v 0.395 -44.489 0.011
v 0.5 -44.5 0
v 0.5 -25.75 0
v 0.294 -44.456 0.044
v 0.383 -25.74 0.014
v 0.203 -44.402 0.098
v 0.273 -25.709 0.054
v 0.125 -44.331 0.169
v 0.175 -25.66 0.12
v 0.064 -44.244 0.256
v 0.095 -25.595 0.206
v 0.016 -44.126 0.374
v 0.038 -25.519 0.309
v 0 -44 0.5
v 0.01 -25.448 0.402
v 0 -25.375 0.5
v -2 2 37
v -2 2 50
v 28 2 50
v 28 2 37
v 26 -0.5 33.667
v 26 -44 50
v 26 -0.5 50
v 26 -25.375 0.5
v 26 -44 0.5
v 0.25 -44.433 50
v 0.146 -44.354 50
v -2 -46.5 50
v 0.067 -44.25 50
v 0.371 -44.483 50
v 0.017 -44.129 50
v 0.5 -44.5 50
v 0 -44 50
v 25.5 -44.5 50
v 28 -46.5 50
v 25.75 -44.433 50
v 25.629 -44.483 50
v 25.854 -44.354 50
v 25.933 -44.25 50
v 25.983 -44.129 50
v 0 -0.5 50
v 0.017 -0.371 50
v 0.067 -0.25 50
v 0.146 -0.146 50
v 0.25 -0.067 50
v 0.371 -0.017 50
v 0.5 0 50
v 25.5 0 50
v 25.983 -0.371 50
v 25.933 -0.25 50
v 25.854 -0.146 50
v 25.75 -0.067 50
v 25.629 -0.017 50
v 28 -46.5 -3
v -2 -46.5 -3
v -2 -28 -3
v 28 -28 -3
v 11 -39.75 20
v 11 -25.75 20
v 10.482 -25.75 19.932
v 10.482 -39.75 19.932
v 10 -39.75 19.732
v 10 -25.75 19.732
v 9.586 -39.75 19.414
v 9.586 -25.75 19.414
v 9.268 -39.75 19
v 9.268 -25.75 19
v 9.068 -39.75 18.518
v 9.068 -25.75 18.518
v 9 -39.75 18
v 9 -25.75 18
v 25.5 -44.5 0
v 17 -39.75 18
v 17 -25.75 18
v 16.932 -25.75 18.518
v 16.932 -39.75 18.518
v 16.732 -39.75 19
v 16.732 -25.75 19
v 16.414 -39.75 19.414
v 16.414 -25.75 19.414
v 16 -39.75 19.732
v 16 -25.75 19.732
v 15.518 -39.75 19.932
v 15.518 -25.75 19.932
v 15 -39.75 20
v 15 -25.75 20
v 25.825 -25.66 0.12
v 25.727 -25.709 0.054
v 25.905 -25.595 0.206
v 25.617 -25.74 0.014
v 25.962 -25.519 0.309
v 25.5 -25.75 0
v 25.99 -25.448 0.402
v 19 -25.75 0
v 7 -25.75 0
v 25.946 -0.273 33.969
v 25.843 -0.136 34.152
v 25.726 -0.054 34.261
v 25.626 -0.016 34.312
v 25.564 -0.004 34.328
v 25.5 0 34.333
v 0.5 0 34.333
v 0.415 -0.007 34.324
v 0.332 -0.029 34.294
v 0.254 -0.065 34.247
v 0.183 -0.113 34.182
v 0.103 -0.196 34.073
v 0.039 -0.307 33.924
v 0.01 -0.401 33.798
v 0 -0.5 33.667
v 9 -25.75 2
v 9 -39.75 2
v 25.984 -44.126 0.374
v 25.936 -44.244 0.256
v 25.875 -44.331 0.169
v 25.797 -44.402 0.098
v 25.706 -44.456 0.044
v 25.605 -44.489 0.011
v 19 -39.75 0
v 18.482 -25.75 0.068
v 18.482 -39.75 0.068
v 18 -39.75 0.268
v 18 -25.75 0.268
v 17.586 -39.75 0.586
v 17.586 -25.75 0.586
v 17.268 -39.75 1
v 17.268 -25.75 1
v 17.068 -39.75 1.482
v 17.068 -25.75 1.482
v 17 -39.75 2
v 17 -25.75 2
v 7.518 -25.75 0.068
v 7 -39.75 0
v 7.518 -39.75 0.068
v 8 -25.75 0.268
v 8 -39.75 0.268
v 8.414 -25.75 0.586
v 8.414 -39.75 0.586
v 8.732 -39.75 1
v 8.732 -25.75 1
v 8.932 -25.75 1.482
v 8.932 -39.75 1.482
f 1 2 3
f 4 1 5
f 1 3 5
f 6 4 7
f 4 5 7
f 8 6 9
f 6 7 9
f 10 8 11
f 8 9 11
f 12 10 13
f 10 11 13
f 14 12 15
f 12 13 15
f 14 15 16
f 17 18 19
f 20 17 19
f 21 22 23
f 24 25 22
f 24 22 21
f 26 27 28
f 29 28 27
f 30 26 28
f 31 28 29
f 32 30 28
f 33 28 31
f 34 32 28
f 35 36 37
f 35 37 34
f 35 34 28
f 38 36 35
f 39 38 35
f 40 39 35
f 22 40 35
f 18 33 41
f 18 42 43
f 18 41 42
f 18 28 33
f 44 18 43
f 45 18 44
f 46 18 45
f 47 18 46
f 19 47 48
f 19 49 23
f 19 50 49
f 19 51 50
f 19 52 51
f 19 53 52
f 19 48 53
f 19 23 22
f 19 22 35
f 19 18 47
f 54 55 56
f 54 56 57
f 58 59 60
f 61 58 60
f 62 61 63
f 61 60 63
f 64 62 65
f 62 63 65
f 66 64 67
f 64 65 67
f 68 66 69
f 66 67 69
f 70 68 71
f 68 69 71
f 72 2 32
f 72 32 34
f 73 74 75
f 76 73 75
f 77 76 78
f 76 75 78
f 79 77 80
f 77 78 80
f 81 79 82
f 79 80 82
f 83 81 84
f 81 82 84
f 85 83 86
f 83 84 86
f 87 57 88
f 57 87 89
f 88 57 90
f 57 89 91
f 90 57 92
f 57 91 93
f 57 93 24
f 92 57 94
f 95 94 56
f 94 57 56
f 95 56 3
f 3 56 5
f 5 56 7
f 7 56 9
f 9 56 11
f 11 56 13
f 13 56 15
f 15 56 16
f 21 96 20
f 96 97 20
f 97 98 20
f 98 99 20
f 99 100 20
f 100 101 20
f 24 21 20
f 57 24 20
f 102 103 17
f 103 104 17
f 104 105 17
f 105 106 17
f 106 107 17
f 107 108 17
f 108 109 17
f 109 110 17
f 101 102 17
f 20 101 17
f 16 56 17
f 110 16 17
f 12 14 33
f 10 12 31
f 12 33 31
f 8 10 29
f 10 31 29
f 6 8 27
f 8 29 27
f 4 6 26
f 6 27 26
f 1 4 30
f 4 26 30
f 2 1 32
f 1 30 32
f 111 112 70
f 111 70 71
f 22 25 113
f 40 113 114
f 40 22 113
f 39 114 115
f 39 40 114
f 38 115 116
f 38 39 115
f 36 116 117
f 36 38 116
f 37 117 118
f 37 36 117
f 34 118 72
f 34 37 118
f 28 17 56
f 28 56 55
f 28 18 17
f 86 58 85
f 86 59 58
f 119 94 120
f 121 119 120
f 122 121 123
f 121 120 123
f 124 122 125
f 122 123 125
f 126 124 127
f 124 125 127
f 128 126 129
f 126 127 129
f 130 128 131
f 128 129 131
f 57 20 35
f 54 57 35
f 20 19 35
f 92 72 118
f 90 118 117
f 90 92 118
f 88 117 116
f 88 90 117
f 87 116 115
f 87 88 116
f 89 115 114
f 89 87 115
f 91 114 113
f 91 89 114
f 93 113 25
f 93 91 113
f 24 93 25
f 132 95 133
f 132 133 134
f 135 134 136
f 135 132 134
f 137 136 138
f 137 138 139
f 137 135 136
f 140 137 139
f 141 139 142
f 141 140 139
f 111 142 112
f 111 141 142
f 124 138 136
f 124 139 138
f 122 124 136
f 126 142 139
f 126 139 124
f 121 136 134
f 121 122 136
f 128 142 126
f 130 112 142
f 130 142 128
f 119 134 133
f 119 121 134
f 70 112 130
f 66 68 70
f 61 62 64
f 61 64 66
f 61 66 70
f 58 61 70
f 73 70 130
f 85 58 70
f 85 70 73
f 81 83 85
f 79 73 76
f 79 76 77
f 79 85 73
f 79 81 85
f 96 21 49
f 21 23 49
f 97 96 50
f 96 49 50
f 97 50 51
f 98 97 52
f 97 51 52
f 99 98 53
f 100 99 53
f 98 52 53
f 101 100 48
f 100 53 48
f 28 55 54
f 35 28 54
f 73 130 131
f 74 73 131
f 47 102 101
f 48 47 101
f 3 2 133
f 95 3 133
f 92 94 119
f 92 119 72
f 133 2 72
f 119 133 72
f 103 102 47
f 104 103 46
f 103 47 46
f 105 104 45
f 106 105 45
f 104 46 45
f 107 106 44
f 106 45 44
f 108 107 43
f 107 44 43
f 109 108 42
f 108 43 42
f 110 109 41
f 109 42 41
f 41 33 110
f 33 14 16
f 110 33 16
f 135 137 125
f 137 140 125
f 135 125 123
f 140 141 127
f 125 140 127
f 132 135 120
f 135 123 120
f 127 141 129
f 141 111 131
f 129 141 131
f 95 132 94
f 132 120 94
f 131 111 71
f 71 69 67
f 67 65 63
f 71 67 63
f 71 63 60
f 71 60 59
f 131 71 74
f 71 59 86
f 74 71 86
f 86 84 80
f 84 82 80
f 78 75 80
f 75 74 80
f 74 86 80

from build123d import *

# Parameters (mm, degrees)
F0_W        = 30
F0_H        = 48.5
F0_W_2      = 26
F0_H_2      = 44.5
F1_DEPTH    = 50
F2_W        = 30
F2_H        = 48.5
F3_DEPTH    = 3
F5_DEPTH    = 30
F6_W        = 4
F6_H        = 14
F7_DEPTH    = 20
F8_R        = 0.5
F9_T1_DEPTH = 14
F9_T3_DEPTH = 19


# Not quite as in the source:
# - a fillet or chamfer that OpenCascade refuses, or shapes differently, is made with other operations: its cross-section is extruded or revolved along the edge and cut away or added


with BuildPart() as f1:
    # F0 (on Top) → F1 (new body)
    with BuildSketch(Plane.XY):
        with Locations((13, -22.25)):
            Rectangle(F0_W, F0_H)
        with Locations((13, -22.25)):
            Rectangle(F0_W_2, F0_H_2, mode=Mode.SUBTRACT)
    extrude(amount=F1_DEPTH)

    # F2 (on face) → F3 (join)
    with BuildSketch(Plane(origin=(0, 0, 0), x_dir=(1, 0, 0), z_dir=(0, 0, -1))):
        with Locations((13, 22.25)):
            Rectangle(F2_W, F2_H)
    extrude(amount=F3_DEPTH)

    # F4 (on face) → F5 (cut)
    with BuildSketch(Plane(origin=(-2, 0, 0), x_dir=(0, -1, 0), z_dir=(-1, 0, 0))):
        Polygon((-2, 37), (-2, -3), (28, -3), align=None)
    extrude(amount=-F5_DEPTH, mode=Mode.SUBTRACT)

    # F6 (on face) → F7 (join)
    with BuildSketch(Plane.XY):
        with Locations((15, -32.75)):
            Rectangle(F6_W, F6_H)
        with Locations((11, -32.75)):
            Rectangle(F6_W, F6_H)
    extrude(amount=F7_DEPTH)

    # F8
    f8_edges = [f1.edges().sort_by_distance(p)[0] for p in [
        (0, -35.125, 0),
        (26, -35.125, 0),
        (0, 0, 42.166667),
        (0, -44.5, 25),
        (26, -44.5, 25),
        (26, 0, 42.166667),
    ]]
    fillet(f8_edges, radius=F8_R)

    # F9: fillet of radius 2 on 4 edges, made by hand

    # F9_s2 → F9_t1 (join)
    with BuildSketch(Plane.XZ.offset(25.75)):
        with BuildLine():
            ThreePointArc((19, 0), (17.5857864376, 0.5857864376), (17, 2))
            Line((17, 2), (17, 0))
            Line((17, 0), (19, 0))
        make_face()
        with BuildLine():
            ThreePointArc((7, 0), (8.4142135624, 0.5857864376), (9, 2))
            Line((9, 2), (9, 0))
            Line((9, 0), (7, 0))
        make_face()
    extrude(amount=F9_T1_DEPTH)

    # F9_s4 → F9_t3 (cut)
    with BuildSketch(Plane.XZ.offset(20.75)):
        with BuildLine():
            ThreePointArc((17, 18), (16.4142135624, 19.4142135624), (15, 20))
            Line((15, 20), (17, 20))
            Line((17, 20), (17, 18))
        make_face()
        with BuildLine():
            ThreePointArc((11, 20), (9.5857864376, 19.4142135624), (9, 18))
            Line((9, 18), (9, 20))
            Line((9, 20), (11, 20))
        make_face()
    extrude(amount=F9_T3_DEPTH, mode=Mode.SUBTRACT)


solid = f1.part
